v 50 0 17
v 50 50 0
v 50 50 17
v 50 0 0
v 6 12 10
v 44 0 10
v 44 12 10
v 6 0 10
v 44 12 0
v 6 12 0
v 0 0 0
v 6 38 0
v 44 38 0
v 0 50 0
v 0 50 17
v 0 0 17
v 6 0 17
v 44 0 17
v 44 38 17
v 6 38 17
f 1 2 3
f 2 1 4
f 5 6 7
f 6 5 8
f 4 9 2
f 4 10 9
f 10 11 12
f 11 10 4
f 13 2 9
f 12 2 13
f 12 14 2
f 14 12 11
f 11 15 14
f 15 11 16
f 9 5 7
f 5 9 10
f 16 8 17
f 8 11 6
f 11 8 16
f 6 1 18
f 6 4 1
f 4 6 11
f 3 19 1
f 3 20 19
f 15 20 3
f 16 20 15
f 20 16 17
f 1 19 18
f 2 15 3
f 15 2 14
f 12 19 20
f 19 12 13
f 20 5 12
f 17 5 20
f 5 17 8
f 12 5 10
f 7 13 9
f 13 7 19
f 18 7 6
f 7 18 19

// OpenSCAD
scale = 1/1000;

scale(scale)
{
    cube([50000, 12000, 10000]);
    translate([0, 38000]) cube([50000, 12000, 17000]);
    cube([6000, 50000, 17000]);
    translate([44000, 0]) 
    cube([6000, 50000, 17000]);
};
